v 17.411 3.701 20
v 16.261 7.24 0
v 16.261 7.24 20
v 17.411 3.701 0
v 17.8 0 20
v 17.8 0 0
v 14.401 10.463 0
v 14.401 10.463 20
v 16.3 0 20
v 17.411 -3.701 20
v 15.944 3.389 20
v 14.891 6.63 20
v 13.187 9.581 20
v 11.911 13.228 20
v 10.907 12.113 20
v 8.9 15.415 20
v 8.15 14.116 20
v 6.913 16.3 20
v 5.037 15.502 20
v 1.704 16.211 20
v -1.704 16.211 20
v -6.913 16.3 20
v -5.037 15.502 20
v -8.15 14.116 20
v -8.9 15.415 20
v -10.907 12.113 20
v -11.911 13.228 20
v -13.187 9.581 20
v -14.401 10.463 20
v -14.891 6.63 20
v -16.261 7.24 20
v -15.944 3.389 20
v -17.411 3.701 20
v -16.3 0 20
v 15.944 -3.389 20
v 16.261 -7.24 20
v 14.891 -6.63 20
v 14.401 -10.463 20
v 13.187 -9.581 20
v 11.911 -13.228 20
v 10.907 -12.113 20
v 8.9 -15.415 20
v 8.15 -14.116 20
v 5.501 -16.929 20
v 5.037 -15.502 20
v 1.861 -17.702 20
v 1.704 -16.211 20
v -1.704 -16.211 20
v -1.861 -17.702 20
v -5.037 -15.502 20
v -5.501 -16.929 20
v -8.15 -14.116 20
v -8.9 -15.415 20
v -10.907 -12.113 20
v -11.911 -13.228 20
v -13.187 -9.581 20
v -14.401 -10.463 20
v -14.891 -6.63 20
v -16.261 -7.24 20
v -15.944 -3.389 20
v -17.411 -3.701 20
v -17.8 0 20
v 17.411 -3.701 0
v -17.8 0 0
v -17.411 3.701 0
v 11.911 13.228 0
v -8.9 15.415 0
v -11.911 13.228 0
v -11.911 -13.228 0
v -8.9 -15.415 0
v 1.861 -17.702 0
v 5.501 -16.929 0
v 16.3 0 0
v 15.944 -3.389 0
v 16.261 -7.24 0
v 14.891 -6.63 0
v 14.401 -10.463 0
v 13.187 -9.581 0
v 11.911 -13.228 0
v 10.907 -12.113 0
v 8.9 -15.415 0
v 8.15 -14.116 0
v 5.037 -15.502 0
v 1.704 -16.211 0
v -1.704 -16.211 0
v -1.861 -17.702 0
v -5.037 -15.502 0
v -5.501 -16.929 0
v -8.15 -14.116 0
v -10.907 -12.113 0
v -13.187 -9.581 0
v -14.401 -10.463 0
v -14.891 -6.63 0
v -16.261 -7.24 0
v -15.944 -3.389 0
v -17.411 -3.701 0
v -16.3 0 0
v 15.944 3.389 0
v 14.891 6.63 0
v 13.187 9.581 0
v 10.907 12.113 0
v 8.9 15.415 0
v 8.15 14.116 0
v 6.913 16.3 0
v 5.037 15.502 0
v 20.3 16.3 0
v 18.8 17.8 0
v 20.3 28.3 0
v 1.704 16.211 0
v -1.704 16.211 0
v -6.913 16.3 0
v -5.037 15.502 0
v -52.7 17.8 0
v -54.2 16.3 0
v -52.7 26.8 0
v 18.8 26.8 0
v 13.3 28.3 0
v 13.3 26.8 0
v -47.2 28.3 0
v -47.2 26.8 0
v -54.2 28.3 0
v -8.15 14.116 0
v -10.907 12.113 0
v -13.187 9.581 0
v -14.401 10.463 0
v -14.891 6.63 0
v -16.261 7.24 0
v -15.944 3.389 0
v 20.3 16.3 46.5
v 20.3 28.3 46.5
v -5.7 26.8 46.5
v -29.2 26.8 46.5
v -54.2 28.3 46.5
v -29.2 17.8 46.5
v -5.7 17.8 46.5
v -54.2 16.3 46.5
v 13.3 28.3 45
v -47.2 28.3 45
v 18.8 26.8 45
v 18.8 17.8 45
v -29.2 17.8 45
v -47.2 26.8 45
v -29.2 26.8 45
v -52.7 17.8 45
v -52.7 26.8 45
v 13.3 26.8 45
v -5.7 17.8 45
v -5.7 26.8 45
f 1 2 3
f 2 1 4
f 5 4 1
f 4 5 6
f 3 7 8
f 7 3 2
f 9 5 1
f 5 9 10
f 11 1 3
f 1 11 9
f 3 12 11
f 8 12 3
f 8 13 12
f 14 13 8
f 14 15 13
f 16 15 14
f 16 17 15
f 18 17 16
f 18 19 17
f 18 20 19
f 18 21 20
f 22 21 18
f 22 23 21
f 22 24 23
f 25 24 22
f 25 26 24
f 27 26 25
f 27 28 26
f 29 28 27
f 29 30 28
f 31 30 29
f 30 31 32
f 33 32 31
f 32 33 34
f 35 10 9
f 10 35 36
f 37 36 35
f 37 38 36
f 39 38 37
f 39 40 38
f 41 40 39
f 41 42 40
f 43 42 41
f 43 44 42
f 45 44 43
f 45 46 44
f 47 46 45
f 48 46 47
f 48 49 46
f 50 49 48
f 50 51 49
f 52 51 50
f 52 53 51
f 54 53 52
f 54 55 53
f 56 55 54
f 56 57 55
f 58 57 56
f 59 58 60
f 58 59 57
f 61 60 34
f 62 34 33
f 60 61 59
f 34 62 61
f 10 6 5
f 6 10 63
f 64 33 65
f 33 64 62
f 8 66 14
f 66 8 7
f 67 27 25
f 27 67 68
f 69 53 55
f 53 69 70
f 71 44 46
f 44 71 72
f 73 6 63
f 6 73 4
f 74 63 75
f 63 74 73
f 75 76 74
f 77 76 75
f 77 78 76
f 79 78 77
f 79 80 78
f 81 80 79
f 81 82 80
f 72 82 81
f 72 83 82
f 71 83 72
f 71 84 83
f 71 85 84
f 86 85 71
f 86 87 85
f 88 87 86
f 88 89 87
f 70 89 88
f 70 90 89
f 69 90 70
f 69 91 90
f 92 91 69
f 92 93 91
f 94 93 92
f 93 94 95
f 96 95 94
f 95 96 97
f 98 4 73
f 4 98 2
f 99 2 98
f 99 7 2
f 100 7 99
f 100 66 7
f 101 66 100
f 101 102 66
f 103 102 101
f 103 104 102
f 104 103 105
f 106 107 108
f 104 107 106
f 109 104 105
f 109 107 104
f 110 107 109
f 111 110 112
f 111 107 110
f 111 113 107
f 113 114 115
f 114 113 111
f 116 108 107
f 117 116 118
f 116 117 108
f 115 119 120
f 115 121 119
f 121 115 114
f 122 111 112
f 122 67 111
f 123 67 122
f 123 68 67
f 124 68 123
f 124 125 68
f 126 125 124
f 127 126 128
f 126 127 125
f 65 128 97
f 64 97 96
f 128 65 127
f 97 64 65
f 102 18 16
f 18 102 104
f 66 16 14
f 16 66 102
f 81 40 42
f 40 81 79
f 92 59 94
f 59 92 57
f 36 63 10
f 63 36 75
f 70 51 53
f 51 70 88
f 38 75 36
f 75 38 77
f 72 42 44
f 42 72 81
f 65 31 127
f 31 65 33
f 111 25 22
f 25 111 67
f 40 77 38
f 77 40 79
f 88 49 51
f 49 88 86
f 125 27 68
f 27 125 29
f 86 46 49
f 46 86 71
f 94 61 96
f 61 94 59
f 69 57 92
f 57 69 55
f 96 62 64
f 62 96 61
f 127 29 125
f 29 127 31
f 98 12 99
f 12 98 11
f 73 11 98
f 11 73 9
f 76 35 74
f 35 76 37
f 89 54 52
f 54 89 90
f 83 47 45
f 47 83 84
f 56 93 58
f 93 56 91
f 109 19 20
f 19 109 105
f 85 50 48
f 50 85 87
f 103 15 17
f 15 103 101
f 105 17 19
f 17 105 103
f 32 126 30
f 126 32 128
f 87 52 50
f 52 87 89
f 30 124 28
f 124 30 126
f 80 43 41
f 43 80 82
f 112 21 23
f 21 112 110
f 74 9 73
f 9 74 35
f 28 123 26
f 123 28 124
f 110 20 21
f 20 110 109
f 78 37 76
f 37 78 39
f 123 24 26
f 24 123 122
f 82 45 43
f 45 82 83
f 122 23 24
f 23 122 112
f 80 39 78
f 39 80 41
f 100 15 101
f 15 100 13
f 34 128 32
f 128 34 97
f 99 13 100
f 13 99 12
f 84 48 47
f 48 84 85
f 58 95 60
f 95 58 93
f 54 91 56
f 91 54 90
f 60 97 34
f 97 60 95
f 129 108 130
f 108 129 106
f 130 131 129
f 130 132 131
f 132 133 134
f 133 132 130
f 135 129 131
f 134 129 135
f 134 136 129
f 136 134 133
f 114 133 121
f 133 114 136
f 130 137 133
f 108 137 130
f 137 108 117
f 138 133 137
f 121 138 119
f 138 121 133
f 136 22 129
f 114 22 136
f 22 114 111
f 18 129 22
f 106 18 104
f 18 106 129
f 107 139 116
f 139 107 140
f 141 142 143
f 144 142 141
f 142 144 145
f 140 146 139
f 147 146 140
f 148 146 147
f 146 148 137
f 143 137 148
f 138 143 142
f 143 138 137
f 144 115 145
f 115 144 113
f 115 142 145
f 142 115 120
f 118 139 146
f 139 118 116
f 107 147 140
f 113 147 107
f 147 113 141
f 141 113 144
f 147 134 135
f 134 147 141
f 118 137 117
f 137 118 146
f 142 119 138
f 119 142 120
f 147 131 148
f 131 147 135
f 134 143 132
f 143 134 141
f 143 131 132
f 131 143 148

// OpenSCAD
use <MCAD/regular_shapes.scad>

r = 32.6/2;
h = 20;
t = 1.5;

p_h = 45;
p_w = 70.5;
p_d = 8;
eps = 1;
o = 5;

cylinder_tube(h, r + t, t);

translate([r - p_w, r, 0])
difference(){
    cube([p_w + eps + 2*t, p_d + eps + 2*t, p_h + t]);
    translate([t, t, 0])
    cube([p_w + eps, p_d + eps, p_h]);
    translate([t + eps/2 + o, p_d+t, 0])
    cube([p_w - 2*o, 2*t, p_h]);
    translate([t + p_w/3, t, 0])
    cube([p_w/3, p_d + eps, p_h * 2]);
}
